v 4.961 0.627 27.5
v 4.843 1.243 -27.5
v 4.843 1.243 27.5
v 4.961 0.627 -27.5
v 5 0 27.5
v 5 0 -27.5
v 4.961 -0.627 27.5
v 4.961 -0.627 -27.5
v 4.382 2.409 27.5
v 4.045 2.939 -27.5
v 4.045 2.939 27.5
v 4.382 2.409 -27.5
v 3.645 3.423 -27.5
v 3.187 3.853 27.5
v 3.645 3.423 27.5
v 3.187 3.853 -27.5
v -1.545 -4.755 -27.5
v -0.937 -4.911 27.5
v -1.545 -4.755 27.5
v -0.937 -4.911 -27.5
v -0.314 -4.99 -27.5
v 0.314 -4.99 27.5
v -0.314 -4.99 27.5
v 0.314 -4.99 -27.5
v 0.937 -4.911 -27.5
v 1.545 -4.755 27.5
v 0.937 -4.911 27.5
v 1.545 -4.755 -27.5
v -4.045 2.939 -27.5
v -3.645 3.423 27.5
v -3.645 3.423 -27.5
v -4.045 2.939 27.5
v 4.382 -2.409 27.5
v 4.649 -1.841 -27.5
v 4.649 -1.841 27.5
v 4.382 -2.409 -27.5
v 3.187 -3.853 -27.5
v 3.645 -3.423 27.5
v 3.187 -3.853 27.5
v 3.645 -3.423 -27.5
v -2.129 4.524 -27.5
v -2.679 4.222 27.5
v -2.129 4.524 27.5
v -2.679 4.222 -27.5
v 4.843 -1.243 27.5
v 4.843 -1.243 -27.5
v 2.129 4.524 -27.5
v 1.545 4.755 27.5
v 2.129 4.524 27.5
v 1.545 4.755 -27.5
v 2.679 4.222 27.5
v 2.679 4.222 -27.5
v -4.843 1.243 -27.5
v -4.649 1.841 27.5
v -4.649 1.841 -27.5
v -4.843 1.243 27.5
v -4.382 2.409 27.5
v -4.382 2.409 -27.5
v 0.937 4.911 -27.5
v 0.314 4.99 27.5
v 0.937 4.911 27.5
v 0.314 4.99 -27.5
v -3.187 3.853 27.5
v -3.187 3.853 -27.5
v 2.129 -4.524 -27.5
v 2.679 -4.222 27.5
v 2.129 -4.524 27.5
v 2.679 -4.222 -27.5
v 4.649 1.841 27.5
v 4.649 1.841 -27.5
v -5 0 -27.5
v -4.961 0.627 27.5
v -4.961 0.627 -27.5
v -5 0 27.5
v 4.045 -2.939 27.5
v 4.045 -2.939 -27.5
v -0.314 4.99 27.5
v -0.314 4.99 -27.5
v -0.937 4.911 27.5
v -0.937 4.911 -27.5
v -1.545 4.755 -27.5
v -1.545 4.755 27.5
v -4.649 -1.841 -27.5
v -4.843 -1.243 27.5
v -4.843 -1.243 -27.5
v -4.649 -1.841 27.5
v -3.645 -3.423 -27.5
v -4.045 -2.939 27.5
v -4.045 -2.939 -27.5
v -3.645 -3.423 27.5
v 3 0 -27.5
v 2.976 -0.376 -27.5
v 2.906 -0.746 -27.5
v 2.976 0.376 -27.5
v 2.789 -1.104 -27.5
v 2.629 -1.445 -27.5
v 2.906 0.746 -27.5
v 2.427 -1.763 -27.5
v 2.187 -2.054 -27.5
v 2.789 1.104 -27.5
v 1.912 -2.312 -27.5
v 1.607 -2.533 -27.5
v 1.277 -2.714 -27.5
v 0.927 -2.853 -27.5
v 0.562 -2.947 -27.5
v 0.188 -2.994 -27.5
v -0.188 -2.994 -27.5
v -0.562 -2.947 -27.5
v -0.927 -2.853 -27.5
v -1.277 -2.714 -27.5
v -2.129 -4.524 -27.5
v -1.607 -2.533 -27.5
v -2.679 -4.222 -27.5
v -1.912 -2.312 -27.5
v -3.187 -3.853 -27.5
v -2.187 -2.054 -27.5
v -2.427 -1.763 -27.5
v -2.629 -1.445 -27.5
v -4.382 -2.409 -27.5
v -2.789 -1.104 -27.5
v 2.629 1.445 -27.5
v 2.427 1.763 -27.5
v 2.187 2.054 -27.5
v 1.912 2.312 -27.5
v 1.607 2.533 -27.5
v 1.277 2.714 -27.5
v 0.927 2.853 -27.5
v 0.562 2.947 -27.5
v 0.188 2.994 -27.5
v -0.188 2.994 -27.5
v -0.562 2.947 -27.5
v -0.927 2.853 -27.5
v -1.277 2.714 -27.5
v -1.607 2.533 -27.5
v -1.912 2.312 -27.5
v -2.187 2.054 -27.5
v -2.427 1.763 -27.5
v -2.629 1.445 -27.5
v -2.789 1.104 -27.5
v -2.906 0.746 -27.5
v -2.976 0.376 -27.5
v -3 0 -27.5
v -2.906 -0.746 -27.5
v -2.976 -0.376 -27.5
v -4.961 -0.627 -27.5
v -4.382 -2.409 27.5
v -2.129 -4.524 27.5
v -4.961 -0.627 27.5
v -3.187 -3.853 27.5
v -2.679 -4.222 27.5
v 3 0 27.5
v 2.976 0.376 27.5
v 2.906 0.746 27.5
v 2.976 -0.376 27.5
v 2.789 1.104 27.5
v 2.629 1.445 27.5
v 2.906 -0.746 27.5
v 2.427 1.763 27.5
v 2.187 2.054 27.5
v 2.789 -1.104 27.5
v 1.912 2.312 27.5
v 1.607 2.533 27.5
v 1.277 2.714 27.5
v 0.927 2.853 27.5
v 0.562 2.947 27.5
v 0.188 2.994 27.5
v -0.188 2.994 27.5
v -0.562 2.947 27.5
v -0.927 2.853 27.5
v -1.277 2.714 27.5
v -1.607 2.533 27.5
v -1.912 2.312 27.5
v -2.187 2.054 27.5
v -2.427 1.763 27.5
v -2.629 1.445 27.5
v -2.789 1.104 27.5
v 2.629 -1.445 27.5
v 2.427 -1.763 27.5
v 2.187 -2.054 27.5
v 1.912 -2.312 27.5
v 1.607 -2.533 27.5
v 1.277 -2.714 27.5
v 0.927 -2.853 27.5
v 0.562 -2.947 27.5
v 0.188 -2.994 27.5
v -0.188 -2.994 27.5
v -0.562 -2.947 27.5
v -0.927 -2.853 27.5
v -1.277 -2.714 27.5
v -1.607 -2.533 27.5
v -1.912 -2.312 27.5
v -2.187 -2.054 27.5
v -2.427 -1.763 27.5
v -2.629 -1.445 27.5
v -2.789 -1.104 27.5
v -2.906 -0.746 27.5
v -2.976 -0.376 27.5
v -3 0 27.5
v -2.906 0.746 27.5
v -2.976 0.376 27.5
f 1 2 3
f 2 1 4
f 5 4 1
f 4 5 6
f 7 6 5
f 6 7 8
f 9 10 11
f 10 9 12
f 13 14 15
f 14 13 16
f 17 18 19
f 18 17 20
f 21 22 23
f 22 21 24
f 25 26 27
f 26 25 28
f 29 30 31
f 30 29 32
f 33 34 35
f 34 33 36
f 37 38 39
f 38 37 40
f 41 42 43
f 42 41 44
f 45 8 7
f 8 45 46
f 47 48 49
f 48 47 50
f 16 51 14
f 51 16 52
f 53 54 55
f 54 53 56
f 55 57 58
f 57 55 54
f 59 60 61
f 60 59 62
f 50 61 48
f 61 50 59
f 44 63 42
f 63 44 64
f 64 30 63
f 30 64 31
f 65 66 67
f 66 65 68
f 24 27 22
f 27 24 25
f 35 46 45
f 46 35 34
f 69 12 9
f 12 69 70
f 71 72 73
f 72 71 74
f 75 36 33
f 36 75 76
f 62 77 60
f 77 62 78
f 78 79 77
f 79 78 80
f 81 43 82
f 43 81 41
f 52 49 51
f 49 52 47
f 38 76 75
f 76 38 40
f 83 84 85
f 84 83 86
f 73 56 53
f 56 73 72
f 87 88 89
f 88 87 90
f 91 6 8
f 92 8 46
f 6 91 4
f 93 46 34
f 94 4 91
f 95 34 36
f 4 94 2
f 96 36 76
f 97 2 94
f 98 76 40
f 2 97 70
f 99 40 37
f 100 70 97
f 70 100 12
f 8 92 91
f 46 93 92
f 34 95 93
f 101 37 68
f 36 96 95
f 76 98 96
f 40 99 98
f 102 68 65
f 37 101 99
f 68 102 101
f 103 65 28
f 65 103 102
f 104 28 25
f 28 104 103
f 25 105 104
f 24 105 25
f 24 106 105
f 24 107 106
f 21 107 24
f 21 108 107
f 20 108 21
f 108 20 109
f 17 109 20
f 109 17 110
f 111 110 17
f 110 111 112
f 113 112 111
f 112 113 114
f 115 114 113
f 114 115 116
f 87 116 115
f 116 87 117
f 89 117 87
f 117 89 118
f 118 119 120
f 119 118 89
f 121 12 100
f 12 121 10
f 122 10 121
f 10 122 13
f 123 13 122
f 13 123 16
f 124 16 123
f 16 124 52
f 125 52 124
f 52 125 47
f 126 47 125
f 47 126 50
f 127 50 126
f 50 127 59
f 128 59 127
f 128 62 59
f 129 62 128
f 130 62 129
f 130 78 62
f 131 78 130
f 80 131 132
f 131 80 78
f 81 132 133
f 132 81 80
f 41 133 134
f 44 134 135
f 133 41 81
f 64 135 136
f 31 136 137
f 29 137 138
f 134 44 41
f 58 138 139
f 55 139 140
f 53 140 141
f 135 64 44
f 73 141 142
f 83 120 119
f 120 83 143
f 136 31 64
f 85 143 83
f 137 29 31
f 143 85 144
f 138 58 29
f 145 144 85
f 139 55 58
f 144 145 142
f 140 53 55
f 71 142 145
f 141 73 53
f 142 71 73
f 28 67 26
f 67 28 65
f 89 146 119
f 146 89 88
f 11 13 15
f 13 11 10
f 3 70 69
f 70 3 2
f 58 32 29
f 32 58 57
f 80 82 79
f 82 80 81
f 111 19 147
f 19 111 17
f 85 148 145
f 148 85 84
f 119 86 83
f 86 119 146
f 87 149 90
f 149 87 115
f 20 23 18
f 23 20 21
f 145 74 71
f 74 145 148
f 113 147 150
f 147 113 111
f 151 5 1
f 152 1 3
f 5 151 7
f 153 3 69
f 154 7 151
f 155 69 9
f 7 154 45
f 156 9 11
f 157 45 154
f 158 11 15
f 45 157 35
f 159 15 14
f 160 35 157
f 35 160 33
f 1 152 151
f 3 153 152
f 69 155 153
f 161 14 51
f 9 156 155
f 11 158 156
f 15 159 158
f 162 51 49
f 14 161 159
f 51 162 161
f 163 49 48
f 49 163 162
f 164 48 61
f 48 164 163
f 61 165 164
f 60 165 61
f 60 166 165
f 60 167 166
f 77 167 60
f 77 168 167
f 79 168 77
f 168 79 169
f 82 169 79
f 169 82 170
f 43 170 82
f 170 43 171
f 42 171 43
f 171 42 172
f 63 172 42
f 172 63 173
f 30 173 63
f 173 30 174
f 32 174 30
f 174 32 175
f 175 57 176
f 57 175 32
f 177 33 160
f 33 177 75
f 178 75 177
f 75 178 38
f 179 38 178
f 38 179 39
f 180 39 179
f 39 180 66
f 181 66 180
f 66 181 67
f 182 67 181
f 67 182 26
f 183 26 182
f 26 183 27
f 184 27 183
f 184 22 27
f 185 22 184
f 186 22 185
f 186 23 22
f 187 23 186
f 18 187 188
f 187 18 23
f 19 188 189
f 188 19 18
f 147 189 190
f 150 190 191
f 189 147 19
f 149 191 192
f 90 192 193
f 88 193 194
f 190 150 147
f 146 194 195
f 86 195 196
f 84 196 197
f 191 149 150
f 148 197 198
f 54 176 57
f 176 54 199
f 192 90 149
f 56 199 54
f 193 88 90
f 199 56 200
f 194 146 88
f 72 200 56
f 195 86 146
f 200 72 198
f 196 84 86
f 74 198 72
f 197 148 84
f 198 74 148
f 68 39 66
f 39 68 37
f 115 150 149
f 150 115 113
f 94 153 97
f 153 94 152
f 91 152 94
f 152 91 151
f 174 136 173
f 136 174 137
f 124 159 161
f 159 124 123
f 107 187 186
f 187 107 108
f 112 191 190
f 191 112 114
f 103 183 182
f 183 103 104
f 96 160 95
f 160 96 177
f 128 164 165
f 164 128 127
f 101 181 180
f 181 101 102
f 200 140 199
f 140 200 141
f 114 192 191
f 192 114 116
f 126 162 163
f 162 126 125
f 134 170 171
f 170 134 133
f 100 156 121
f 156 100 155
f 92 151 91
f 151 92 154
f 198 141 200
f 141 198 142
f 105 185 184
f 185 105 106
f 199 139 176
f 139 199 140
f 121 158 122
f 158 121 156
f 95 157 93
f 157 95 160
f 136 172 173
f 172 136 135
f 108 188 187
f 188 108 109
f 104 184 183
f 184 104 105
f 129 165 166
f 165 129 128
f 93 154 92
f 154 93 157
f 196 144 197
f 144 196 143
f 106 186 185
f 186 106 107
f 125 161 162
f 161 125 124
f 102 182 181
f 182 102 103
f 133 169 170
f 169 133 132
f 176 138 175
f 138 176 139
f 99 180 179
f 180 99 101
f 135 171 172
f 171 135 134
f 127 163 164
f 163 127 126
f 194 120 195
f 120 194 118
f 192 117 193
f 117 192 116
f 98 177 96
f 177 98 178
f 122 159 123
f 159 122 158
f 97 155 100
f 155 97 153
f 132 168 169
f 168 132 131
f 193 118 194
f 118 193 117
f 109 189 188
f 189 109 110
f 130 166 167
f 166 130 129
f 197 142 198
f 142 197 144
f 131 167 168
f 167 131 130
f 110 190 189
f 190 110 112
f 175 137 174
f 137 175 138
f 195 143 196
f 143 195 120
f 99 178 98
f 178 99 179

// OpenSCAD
$fn = 50;


difference() {
	union() {
		translate(v = [0, 0, -27.5000000000]) {
			cylinder(h = 55, r = 5.0000000000);
		}
	}
	union() {
		translate(v = [0, 0, -100.0000000000]) {
			cylinder(h = 200, r = 3.0000000000);
		}
	}
}
